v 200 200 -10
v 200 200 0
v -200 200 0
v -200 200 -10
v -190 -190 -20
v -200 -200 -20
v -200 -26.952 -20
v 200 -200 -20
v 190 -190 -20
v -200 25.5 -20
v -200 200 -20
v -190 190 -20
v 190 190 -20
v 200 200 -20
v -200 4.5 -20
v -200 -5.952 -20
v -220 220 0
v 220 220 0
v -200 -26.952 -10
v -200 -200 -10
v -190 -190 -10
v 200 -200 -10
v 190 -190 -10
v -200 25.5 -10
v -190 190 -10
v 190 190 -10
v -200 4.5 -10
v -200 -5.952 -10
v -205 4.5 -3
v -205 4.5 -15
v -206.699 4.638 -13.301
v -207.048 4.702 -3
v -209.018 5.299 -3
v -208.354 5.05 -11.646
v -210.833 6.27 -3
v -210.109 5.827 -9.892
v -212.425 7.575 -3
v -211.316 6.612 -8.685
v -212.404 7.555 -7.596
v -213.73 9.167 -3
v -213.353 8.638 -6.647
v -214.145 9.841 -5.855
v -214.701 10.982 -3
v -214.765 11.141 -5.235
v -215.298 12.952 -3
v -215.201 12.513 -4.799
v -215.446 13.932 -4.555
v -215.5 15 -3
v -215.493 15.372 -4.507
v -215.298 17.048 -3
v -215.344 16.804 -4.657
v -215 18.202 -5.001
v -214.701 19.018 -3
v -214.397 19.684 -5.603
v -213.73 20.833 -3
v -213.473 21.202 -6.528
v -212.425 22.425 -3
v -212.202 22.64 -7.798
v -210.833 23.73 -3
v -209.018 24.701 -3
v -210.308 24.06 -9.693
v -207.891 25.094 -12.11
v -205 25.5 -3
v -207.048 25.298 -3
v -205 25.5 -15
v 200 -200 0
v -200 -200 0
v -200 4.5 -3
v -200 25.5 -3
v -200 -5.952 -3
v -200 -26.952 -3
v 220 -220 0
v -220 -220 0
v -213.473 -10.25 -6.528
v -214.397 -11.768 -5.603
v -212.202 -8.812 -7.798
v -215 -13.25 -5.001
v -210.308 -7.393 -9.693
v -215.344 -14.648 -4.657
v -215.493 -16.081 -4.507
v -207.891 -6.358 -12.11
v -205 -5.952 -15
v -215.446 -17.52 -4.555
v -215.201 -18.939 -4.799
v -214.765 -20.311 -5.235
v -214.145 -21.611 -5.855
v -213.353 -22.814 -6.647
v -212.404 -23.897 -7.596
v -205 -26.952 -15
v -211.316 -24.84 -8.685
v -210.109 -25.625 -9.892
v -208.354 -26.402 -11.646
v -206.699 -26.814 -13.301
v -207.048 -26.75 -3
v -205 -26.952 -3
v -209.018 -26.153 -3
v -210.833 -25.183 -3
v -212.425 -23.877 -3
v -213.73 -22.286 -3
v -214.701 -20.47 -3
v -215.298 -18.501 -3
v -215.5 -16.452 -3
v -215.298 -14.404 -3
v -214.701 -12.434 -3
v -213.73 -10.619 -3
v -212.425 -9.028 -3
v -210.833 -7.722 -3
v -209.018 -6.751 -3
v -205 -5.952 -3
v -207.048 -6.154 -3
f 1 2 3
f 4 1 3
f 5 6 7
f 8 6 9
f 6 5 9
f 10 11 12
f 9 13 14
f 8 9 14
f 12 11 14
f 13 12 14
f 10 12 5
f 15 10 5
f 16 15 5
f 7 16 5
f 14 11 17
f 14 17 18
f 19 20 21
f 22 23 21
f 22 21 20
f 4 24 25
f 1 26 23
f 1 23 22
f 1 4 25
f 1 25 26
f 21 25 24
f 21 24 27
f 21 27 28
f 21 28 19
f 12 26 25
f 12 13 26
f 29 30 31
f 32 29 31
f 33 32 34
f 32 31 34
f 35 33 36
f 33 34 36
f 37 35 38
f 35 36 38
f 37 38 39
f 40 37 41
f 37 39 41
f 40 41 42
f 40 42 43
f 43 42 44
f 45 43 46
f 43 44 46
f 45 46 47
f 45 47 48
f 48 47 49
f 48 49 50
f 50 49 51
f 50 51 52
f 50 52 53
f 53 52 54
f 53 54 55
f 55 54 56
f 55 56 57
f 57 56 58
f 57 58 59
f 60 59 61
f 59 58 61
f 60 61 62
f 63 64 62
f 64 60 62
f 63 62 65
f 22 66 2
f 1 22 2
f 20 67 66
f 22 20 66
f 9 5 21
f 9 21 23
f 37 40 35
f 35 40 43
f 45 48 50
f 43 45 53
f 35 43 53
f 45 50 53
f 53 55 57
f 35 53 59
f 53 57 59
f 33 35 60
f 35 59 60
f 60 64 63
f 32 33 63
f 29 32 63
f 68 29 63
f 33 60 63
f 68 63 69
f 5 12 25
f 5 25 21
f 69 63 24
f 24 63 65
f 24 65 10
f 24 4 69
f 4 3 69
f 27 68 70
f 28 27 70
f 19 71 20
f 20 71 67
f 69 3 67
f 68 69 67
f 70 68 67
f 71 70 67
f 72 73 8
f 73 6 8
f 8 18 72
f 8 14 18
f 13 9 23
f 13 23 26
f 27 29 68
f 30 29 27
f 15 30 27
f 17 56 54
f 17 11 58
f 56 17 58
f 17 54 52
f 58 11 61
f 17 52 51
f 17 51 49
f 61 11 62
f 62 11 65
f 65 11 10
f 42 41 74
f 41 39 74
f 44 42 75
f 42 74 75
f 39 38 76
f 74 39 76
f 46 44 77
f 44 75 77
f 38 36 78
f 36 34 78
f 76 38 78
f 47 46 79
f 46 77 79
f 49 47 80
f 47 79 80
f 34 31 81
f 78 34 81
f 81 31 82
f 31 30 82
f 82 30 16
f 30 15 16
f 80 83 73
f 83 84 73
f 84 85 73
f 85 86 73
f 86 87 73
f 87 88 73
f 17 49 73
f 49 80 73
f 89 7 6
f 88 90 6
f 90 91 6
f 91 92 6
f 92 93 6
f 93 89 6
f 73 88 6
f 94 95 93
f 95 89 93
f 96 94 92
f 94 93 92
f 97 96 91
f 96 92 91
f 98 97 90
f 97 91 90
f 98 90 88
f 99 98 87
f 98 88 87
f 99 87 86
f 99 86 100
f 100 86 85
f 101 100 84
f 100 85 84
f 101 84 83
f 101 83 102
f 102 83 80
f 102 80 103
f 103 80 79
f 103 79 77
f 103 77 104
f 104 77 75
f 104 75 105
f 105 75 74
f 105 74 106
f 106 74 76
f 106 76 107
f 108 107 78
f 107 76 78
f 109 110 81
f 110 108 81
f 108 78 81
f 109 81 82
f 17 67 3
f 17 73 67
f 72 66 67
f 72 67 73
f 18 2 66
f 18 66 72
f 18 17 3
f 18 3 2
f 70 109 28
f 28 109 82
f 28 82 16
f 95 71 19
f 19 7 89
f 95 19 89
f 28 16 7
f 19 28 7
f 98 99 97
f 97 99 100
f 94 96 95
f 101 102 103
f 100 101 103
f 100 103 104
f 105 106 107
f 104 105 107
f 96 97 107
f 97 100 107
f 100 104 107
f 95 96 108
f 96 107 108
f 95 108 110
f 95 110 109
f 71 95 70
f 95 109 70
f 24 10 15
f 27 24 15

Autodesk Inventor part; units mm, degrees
ref_plane "YZ Plane" through (0, 0, 0) normal (1, 0, 0) x (0, 1, 0)
ref_plane "XZ Plane" through (0, 0, 0) normal (0, 1, 0) x (-1, 0, 0)
ref_plane "XY Plane" through (0, 0, 0) normal (0, 0, 1) x (1, 0, 0)
sketch "Skizze1" plane through (0, 0, 0) normal (0, 0, 1) x (1, 0, 0)
  line L0 (-220, -220) -> (220, -220) projected
  line L1 (220, 220) -> (220, -220) projected
  line L2 (-220, 220) -> (-220, -220) projected
  line L3 (-220, 220) -> (220, 220) projected
  line L4 (200, 200) -> (-200, 200) projected
  line L5 (-200, 200) -> (-200, -200) projected
  line L6 (-200, -200) -> (200, -200) projected
  line L7 (200, -200) -> (200, 200) projected
  line L8 (220, -220) -> (-220, -220)
  line L9 (-220, -220) -> (-220, 220)
  line L10 (-220, 220) -> (220, 220)
  line L11 (220, 220) -> (220, -220)
  line L12 (200, -200) -> (-200, -200)
  line L13 (-200, -200) -> (-200, 200)
  line L14 (-200, 200) -> (200, 200)
  line L15 (200, 200) -> (200, -200)
  point P0 (0, 0)
extrude "Extrusion1" add sketch "Skizze1" against normal blind 20
chamfer "Fase1" distance 20 angle 45 4 edges at (220, 0, -20) (0, 220, -20) (0, -220, -20) (-220, 0, -20)
ref_plane "Arbeitsebene1" through (0, 0, -20) normal (0, 0, 1) x (1, 0, 0)
sketch "Skizze3" plane through (0, 0, -20) normal (0, 0, 1) x (1, 0, 0)
  arc A0 (-205, 25.5) -> (-205, 4.5) centre (-205, 15) ccw projected
  arc A1 (-205, 25.5) -> (-205, 4.5) centre (-205, 15) ccw projected
  arc A2 (-205, -5.9522) -> (-205, -26.9522) centre (-205, -16.4522) ccw projected
  arc A3 (-205, -5.9522) -> (-205, -26.9522) centre (-205, -16.4522) ccw projected
  arc A4 (-205, -5.9522) -> (-205, -26.9522) centre (-205, -16.4522) ccw projected
  arc A5 (-205, -5.9522) -> (-205, -26.9522) centre (-205, -16.4522) ccw projected
  line L0 (-200, -26.9522) -> (-205, -26.9522) projected
  line L1 (-205, -5.9522) -> (-200, -5.9522) projected
  line L2 (-205, 4.5) -> (-200, 4.5)
  line L3 (-200, -200) -> (-200, 200) projected
  line L4 (-205, 25.5) -> (-200, 25.5)
  line L5 (-205, -5.9522) -> (-200, -5.9522)
  line L6 (-205, -26.9522) -> (-200, -26.9522)
  arc A6 (-205, 25.5) -> (-205, 4.5) centre (-205, 15) ccw
  arc A7 (-205, -5.9522) -> (-205, -26.9522) centre (-205, -16.4522) ccw
  point P0 (0, 0)
extrude "Extrusion2" cut sketch "Skizze3" along normal blind 17
sketch "Skizze5" plane through (0, 0, -20) normal (0, 0, 1) x (1, 0, 0)
  line L0 (-200, -26.9522) -> (-200, -200) projected
  line L1 (-200, -200) -> (200, -200) projected
  line L2 (200, -200) -> (200, 200) projected
  line L3 (-200, 200) -> (200, 200) projected
  line L4 (-200, -200) -> (200, -200)
  line L5 (200, -200) -> (200, 200)
  line L6 (200, 200) -> (-200, 200)
  line L7 (-200, 200) -> (-200, -200)
  line L8 (-190, -190) -> (190, -190)
  line L9 (190, -190) -> (190, 190)
  line L10 (190, 190) -> (-190, 190)
  line L11 (-190, 190) -> (-190, -190)
  point P0 (0, 0)
  dimension "d8" = 10
  dimension "d9" = 10
  dimension "d10" = 10
  dimension "d11" = 10
extrude "Extrusion3" add sketch "Skizze5" along normal blind 10
properties part number "PV_Ramen_CPY_3_2"
